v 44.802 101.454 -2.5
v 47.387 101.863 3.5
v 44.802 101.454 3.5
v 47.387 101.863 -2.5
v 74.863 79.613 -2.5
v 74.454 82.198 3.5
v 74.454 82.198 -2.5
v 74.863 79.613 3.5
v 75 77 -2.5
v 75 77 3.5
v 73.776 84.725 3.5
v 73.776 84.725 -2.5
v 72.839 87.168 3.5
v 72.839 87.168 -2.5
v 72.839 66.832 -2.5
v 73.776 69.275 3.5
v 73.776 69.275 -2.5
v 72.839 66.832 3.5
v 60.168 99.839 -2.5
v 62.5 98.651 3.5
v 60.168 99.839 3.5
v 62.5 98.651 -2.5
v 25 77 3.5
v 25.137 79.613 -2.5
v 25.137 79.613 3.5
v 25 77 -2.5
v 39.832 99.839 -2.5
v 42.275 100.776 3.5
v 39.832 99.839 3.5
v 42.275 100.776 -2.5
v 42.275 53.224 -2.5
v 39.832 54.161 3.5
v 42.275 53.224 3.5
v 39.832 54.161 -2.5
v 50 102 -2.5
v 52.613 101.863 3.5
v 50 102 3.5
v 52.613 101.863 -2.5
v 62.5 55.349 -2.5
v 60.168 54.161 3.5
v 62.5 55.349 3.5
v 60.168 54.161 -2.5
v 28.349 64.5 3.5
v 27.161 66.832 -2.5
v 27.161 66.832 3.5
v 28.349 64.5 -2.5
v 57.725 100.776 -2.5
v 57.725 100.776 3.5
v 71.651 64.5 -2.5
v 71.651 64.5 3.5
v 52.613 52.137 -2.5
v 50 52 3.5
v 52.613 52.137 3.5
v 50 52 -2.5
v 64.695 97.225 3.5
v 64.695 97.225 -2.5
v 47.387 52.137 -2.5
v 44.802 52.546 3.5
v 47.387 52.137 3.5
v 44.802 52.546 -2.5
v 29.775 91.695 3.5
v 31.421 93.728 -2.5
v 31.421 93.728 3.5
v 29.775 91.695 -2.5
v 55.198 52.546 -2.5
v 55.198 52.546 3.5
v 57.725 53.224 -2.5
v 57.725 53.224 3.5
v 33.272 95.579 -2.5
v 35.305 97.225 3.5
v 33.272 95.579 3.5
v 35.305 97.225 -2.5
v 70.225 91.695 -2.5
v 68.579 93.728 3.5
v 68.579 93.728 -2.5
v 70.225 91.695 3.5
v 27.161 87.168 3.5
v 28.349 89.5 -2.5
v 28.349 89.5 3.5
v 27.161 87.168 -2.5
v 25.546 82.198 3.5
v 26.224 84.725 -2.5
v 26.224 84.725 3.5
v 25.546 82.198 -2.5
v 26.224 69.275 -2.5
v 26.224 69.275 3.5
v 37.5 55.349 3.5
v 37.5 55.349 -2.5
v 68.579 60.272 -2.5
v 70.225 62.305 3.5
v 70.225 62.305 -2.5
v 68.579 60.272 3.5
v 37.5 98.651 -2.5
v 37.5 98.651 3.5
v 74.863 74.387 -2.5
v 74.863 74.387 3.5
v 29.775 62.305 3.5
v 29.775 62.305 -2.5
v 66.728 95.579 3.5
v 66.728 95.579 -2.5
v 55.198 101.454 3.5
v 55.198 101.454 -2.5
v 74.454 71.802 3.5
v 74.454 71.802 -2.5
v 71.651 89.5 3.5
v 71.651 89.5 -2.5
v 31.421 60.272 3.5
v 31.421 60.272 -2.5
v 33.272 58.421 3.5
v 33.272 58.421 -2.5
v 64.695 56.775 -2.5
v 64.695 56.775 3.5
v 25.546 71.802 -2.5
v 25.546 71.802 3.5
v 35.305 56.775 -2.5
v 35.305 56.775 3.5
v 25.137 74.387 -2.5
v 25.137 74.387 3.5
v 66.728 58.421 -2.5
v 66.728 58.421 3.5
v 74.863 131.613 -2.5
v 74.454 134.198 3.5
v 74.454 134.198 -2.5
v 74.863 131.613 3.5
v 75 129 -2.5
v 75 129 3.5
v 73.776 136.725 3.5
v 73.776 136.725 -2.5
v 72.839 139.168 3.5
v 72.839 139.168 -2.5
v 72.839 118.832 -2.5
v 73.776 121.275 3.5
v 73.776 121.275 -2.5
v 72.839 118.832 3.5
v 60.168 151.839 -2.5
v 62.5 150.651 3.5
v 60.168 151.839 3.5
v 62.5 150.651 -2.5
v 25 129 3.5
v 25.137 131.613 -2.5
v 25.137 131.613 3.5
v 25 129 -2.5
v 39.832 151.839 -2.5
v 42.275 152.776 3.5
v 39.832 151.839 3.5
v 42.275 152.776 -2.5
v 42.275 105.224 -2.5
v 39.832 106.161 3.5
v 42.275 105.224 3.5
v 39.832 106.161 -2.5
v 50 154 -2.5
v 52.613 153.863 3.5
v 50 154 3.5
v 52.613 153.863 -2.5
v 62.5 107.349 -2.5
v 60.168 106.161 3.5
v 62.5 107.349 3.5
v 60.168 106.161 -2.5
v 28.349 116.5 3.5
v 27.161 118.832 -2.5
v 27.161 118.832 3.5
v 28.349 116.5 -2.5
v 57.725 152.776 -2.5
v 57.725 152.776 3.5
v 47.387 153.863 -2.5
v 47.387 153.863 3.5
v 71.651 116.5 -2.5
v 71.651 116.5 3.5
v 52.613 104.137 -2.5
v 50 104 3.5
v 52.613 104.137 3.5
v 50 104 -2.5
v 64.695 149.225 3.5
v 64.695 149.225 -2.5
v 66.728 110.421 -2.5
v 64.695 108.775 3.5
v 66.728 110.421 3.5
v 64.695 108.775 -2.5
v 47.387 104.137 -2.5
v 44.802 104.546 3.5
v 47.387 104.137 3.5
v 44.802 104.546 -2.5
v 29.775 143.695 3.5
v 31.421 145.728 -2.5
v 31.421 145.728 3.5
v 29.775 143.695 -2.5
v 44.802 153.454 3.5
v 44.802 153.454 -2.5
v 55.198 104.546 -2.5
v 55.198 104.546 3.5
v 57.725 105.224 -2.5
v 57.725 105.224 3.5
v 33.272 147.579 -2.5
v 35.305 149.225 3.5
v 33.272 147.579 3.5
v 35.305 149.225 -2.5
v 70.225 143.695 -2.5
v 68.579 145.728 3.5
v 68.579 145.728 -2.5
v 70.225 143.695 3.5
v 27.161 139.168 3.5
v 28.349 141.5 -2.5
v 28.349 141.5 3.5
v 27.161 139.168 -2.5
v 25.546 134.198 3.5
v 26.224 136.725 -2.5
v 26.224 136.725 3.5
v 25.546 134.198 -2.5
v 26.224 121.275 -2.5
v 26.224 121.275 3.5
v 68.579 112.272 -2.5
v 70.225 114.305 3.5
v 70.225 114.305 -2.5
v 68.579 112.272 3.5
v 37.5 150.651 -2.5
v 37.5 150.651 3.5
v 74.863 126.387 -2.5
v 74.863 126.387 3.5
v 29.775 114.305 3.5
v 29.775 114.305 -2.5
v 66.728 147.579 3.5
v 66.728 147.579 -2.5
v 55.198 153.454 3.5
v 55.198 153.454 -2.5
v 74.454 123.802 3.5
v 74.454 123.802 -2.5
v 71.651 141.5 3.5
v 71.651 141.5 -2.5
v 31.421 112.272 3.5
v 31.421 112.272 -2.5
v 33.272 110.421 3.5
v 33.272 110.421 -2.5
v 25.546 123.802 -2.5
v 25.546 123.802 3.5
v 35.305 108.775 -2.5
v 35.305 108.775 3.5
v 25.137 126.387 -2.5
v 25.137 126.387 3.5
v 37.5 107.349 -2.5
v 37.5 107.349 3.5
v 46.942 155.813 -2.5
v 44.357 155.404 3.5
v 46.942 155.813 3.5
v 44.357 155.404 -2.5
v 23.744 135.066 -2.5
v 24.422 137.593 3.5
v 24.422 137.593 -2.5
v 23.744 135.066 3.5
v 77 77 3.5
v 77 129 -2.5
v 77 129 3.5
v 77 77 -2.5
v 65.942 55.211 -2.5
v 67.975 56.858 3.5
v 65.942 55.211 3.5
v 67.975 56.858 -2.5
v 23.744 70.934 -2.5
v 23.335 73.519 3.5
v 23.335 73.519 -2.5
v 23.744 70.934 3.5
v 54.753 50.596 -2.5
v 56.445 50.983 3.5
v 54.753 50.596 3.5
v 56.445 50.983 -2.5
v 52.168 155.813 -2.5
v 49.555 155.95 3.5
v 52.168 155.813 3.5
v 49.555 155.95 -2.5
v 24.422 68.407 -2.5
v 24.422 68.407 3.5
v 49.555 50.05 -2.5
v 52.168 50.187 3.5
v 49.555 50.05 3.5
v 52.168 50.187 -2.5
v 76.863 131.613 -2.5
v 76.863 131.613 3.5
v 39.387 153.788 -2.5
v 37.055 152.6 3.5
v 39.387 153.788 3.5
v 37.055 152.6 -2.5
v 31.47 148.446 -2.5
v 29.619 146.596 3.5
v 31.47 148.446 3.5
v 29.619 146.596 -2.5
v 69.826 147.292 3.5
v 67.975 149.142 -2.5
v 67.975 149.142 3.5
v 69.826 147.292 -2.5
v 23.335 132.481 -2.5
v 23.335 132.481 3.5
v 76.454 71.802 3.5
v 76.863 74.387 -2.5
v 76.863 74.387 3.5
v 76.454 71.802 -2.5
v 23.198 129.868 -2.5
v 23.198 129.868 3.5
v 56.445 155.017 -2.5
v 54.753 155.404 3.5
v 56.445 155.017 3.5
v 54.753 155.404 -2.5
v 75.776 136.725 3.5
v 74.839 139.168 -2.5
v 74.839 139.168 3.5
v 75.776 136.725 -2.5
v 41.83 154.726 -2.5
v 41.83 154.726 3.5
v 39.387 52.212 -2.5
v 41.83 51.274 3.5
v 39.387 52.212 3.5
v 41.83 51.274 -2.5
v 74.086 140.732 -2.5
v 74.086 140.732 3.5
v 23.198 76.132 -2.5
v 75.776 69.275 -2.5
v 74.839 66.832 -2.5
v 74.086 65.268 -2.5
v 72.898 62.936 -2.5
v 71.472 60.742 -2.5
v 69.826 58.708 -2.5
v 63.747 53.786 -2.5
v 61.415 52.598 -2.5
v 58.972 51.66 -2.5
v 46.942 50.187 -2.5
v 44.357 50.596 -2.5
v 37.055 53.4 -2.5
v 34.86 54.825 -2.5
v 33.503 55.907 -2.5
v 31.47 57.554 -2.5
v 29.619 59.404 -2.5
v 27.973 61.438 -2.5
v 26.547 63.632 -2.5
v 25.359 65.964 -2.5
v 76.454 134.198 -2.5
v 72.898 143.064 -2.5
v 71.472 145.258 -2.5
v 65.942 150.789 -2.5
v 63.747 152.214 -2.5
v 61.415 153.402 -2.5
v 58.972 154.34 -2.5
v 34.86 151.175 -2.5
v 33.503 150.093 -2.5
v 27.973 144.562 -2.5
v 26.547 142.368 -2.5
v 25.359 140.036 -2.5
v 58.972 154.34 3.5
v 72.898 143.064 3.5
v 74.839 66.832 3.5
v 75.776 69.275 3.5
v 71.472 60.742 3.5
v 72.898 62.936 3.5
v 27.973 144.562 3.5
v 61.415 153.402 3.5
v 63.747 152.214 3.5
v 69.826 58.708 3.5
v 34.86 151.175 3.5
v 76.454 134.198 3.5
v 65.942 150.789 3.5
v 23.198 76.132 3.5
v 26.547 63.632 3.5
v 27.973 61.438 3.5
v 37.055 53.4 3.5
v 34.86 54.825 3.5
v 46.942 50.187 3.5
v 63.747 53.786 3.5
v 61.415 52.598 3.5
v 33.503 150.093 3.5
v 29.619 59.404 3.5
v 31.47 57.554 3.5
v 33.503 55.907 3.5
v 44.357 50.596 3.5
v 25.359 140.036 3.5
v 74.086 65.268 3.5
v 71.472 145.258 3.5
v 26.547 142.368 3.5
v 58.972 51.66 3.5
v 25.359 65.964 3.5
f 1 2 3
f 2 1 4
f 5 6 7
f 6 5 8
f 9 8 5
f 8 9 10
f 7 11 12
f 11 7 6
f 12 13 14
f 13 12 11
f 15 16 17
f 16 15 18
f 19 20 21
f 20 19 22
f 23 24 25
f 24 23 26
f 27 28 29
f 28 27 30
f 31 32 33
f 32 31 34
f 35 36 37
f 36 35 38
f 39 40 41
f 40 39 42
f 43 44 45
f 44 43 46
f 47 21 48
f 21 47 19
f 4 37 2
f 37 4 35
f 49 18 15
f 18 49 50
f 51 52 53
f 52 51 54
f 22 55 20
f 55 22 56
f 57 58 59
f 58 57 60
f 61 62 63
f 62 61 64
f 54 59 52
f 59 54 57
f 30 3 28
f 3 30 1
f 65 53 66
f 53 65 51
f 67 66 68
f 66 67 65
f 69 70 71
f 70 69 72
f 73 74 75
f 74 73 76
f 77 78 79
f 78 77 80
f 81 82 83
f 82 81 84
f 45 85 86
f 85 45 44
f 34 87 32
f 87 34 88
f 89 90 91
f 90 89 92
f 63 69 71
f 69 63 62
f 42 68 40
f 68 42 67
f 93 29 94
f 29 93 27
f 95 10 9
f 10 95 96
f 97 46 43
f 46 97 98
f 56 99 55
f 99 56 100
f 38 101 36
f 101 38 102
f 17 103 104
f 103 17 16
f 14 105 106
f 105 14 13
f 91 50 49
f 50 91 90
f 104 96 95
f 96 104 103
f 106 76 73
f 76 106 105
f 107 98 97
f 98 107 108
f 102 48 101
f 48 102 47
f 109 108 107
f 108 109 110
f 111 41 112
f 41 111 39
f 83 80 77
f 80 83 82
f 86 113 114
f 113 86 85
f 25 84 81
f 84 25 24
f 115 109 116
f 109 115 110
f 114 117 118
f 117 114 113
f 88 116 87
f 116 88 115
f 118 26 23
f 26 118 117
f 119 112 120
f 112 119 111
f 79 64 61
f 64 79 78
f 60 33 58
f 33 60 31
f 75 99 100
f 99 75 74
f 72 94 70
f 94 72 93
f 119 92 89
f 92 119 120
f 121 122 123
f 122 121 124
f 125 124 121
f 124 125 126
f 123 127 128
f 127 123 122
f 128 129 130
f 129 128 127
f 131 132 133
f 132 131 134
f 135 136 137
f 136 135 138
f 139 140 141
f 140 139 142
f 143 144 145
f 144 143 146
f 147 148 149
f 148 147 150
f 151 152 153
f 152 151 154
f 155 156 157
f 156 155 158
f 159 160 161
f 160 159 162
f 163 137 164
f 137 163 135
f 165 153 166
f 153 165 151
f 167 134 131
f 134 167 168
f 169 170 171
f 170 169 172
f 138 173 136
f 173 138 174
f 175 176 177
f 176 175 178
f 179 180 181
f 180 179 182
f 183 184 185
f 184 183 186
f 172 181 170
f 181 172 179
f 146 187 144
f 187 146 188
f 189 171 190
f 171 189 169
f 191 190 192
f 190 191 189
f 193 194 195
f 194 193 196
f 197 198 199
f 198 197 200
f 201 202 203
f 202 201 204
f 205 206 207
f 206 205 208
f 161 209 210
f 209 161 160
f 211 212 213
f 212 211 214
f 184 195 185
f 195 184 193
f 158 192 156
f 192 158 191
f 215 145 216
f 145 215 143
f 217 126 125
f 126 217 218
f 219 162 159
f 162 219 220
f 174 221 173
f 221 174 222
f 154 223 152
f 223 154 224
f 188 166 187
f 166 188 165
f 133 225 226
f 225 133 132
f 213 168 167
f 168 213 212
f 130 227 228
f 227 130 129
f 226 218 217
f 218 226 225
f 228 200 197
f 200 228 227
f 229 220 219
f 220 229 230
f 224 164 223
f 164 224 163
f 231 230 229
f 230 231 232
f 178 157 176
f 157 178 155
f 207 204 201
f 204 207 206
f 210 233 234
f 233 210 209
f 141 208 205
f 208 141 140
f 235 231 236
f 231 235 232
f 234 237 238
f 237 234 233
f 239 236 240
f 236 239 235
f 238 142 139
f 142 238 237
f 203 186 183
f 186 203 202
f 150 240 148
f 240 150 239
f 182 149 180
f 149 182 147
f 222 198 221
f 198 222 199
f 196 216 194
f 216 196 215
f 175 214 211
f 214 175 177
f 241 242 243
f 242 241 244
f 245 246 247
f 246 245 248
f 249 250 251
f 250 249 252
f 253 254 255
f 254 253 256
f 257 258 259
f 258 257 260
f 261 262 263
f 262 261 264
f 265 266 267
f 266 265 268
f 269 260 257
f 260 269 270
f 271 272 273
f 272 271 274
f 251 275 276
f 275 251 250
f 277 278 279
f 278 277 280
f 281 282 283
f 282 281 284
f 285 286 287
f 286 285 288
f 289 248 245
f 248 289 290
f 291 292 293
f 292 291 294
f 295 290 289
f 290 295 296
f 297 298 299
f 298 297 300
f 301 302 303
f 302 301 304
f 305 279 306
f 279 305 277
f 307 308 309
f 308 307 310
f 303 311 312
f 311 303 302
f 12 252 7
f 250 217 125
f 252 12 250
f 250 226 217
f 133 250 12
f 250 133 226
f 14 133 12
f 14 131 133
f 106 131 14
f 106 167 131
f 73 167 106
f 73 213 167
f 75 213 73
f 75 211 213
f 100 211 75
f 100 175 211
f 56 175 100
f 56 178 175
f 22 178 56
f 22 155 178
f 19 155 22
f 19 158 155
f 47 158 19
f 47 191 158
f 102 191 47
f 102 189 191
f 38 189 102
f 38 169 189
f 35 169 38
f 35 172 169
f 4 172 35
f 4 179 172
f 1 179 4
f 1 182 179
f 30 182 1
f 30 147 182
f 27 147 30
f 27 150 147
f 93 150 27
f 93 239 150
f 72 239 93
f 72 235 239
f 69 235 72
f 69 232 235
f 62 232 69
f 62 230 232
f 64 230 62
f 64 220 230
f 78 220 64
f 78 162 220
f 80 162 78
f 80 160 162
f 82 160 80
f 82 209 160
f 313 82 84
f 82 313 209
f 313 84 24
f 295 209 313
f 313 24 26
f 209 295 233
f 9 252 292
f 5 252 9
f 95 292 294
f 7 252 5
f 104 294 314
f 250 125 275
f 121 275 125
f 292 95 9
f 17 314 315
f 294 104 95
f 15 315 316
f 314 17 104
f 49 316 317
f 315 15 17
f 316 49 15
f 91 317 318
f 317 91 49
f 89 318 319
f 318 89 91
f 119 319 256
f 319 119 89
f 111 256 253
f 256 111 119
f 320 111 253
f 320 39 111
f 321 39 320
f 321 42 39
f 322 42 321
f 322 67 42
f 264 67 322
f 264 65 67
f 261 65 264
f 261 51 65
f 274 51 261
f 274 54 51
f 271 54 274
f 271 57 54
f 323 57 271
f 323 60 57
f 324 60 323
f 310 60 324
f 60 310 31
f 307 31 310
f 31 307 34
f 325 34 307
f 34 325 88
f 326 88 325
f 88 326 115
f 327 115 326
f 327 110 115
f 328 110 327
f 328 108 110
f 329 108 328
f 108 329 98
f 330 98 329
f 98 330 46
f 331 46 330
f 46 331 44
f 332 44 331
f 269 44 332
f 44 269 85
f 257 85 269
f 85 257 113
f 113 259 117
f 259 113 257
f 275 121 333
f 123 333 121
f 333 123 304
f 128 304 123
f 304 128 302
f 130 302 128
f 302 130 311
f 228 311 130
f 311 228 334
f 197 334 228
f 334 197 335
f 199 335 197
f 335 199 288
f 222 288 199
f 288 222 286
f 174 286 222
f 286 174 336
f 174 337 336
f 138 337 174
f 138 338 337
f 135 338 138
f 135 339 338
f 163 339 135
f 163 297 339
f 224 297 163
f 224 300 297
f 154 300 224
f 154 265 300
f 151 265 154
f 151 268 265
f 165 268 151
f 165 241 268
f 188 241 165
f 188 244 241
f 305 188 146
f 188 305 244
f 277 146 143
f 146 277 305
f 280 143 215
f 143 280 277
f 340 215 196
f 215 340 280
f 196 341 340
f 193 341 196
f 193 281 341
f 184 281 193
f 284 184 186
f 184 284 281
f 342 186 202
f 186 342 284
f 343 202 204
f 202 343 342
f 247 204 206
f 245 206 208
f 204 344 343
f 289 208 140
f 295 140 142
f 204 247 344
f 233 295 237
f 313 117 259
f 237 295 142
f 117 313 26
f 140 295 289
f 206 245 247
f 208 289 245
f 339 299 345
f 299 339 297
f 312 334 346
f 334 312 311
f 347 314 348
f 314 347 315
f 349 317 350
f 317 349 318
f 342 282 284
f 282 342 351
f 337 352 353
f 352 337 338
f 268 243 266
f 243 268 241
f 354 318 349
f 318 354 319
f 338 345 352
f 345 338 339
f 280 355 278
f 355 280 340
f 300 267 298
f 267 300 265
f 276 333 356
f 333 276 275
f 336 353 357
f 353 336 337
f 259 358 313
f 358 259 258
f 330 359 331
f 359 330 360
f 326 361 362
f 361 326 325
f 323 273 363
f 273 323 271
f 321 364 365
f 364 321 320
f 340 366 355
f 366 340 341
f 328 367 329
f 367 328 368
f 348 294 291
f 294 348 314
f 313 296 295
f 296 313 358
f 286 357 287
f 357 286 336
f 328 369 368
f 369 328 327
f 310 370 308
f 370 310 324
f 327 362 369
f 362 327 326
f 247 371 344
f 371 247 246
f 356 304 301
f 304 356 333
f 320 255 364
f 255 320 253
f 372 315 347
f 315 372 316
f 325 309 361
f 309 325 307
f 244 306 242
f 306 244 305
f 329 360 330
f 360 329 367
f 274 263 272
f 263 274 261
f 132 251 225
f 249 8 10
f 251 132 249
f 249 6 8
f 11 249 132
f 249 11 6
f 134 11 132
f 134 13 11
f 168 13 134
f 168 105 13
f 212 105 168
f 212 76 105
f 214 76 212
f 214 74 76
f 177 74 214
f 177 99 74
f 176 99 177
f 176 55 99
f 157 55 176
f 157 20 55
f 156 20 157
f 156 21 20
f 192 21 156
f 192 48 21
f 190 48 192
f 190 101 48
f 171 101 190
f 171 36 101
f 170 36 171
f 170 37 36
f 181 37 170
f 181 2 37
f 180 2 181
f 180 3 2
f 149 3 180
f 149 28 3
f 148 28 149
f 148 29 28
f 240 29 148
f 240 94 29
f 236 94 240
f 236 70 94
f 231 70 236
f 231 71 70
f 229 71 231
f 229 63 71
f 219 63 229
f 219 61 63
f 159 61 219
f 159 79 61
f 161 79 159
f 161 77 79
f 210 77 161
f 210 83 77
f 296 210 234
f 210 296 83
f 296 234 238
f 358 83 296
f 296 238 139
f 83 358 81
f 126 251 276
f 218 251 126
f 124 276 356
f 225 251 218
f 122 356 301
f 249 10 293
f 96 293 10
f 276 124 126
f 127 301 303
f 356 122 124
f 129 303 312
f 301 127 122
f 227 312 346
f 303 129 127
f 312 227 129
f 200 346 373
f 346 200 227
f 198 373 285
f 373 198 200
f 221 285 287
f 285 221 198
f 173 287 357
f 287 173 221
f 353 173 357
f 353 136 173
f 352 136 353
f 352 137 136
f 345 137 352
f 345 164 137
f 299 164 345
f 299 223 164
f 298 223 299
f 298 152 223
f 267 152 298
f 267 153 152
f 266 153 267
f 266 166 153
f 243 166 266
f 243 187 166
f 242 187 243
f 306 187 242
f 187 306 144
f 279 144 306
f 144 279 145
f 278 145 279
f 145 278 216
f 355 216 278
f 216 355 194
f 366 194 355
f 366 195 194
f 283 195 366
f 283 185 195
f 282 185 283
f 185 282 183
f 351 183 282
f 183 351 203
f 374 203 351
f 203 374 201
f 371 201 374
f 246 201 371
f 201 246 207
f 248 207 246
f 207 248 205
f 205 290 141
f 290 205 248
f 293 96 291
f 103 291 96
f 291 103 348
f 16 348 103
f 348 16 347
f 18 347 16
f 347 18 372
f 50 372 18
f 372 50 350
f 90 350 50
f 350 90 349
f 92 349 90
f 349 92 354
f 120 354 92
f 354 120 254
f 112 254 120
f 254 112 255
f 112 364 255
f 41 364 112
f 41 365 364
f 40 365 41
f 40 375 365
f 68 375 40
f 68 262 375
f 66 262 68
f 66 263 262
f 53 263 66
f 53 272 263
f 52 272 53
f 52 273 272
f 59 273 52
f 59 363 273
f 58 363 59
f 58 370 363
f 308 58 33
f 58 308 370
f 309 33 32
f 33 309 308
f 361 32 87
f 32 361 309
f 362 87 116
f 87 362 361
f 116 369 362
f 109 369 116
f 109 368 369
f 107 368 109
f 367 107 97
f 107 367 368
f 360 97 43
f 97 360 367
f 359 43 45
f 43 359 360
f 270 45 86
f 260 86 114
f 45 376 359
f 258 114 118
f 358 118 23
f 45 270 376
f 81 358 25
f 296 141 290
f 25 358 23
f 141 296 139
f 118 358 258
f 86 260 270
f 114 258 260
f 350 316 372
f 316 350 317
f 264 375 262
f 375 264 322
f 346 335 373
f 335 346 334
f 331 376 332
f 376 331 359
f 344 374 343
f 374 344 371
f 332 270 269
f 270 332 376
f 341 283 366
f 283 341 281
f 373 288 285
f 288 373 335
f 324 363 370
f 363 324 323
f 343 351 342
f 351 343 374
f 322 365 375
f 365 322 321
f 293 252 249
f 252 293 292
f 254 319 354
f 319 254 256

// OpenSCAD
/*
 * Parametric Hole Mold
 *
 * By: Mike Creuzer <thingiverse@creuzer.com>
 * 
 * http://www.thingiverse.com/thing:22006
 *
 * Version 1.0
 */


// everything is in mm so if you want to use inches, use the following conversion
//inchestomm = 25.4 ;

height    = 5;
// Remember the diameter is twice the radius (full circle size)
diameter = 25; // Remember the diameter is twice the radius (full circle size)

rows   = 1; // Number of rows to have
cols    = 2; // Number of cols to have



difference() {
	shell();
	holes(2); // make 'em taller so we cut right through, otherwise we end up with a thin shell
}



// make the frame of the mould
module shell()
{
	minkowski()
	{
		hull() {	
			holes();	
		}
		cylinder(r=2);
	}
}


// calculate the series of holes needed to make the mold
module holes( multiplier = 1 )
{
for ( i = [1 : rows] )
{
	
	for ( j = [1 : cols] )
	{
		if(i % 2 == 1)
		{
			translate([(2 * diameter + 1) * i -  i   , ((2 * diameter + 2) * j) + diameter, 0])
				cylinder(r =diameter, h = height * multiplier, $fa=6, center = true);
		
		}else
		{
			translate([(2 * diameter + 1) * i - i  , (2 * diameter + 2) * j , 0])
				cylinder(r =diameter, h = height * multiplier, $fa=6, center = true);
		
		
		}
	}
}

}
